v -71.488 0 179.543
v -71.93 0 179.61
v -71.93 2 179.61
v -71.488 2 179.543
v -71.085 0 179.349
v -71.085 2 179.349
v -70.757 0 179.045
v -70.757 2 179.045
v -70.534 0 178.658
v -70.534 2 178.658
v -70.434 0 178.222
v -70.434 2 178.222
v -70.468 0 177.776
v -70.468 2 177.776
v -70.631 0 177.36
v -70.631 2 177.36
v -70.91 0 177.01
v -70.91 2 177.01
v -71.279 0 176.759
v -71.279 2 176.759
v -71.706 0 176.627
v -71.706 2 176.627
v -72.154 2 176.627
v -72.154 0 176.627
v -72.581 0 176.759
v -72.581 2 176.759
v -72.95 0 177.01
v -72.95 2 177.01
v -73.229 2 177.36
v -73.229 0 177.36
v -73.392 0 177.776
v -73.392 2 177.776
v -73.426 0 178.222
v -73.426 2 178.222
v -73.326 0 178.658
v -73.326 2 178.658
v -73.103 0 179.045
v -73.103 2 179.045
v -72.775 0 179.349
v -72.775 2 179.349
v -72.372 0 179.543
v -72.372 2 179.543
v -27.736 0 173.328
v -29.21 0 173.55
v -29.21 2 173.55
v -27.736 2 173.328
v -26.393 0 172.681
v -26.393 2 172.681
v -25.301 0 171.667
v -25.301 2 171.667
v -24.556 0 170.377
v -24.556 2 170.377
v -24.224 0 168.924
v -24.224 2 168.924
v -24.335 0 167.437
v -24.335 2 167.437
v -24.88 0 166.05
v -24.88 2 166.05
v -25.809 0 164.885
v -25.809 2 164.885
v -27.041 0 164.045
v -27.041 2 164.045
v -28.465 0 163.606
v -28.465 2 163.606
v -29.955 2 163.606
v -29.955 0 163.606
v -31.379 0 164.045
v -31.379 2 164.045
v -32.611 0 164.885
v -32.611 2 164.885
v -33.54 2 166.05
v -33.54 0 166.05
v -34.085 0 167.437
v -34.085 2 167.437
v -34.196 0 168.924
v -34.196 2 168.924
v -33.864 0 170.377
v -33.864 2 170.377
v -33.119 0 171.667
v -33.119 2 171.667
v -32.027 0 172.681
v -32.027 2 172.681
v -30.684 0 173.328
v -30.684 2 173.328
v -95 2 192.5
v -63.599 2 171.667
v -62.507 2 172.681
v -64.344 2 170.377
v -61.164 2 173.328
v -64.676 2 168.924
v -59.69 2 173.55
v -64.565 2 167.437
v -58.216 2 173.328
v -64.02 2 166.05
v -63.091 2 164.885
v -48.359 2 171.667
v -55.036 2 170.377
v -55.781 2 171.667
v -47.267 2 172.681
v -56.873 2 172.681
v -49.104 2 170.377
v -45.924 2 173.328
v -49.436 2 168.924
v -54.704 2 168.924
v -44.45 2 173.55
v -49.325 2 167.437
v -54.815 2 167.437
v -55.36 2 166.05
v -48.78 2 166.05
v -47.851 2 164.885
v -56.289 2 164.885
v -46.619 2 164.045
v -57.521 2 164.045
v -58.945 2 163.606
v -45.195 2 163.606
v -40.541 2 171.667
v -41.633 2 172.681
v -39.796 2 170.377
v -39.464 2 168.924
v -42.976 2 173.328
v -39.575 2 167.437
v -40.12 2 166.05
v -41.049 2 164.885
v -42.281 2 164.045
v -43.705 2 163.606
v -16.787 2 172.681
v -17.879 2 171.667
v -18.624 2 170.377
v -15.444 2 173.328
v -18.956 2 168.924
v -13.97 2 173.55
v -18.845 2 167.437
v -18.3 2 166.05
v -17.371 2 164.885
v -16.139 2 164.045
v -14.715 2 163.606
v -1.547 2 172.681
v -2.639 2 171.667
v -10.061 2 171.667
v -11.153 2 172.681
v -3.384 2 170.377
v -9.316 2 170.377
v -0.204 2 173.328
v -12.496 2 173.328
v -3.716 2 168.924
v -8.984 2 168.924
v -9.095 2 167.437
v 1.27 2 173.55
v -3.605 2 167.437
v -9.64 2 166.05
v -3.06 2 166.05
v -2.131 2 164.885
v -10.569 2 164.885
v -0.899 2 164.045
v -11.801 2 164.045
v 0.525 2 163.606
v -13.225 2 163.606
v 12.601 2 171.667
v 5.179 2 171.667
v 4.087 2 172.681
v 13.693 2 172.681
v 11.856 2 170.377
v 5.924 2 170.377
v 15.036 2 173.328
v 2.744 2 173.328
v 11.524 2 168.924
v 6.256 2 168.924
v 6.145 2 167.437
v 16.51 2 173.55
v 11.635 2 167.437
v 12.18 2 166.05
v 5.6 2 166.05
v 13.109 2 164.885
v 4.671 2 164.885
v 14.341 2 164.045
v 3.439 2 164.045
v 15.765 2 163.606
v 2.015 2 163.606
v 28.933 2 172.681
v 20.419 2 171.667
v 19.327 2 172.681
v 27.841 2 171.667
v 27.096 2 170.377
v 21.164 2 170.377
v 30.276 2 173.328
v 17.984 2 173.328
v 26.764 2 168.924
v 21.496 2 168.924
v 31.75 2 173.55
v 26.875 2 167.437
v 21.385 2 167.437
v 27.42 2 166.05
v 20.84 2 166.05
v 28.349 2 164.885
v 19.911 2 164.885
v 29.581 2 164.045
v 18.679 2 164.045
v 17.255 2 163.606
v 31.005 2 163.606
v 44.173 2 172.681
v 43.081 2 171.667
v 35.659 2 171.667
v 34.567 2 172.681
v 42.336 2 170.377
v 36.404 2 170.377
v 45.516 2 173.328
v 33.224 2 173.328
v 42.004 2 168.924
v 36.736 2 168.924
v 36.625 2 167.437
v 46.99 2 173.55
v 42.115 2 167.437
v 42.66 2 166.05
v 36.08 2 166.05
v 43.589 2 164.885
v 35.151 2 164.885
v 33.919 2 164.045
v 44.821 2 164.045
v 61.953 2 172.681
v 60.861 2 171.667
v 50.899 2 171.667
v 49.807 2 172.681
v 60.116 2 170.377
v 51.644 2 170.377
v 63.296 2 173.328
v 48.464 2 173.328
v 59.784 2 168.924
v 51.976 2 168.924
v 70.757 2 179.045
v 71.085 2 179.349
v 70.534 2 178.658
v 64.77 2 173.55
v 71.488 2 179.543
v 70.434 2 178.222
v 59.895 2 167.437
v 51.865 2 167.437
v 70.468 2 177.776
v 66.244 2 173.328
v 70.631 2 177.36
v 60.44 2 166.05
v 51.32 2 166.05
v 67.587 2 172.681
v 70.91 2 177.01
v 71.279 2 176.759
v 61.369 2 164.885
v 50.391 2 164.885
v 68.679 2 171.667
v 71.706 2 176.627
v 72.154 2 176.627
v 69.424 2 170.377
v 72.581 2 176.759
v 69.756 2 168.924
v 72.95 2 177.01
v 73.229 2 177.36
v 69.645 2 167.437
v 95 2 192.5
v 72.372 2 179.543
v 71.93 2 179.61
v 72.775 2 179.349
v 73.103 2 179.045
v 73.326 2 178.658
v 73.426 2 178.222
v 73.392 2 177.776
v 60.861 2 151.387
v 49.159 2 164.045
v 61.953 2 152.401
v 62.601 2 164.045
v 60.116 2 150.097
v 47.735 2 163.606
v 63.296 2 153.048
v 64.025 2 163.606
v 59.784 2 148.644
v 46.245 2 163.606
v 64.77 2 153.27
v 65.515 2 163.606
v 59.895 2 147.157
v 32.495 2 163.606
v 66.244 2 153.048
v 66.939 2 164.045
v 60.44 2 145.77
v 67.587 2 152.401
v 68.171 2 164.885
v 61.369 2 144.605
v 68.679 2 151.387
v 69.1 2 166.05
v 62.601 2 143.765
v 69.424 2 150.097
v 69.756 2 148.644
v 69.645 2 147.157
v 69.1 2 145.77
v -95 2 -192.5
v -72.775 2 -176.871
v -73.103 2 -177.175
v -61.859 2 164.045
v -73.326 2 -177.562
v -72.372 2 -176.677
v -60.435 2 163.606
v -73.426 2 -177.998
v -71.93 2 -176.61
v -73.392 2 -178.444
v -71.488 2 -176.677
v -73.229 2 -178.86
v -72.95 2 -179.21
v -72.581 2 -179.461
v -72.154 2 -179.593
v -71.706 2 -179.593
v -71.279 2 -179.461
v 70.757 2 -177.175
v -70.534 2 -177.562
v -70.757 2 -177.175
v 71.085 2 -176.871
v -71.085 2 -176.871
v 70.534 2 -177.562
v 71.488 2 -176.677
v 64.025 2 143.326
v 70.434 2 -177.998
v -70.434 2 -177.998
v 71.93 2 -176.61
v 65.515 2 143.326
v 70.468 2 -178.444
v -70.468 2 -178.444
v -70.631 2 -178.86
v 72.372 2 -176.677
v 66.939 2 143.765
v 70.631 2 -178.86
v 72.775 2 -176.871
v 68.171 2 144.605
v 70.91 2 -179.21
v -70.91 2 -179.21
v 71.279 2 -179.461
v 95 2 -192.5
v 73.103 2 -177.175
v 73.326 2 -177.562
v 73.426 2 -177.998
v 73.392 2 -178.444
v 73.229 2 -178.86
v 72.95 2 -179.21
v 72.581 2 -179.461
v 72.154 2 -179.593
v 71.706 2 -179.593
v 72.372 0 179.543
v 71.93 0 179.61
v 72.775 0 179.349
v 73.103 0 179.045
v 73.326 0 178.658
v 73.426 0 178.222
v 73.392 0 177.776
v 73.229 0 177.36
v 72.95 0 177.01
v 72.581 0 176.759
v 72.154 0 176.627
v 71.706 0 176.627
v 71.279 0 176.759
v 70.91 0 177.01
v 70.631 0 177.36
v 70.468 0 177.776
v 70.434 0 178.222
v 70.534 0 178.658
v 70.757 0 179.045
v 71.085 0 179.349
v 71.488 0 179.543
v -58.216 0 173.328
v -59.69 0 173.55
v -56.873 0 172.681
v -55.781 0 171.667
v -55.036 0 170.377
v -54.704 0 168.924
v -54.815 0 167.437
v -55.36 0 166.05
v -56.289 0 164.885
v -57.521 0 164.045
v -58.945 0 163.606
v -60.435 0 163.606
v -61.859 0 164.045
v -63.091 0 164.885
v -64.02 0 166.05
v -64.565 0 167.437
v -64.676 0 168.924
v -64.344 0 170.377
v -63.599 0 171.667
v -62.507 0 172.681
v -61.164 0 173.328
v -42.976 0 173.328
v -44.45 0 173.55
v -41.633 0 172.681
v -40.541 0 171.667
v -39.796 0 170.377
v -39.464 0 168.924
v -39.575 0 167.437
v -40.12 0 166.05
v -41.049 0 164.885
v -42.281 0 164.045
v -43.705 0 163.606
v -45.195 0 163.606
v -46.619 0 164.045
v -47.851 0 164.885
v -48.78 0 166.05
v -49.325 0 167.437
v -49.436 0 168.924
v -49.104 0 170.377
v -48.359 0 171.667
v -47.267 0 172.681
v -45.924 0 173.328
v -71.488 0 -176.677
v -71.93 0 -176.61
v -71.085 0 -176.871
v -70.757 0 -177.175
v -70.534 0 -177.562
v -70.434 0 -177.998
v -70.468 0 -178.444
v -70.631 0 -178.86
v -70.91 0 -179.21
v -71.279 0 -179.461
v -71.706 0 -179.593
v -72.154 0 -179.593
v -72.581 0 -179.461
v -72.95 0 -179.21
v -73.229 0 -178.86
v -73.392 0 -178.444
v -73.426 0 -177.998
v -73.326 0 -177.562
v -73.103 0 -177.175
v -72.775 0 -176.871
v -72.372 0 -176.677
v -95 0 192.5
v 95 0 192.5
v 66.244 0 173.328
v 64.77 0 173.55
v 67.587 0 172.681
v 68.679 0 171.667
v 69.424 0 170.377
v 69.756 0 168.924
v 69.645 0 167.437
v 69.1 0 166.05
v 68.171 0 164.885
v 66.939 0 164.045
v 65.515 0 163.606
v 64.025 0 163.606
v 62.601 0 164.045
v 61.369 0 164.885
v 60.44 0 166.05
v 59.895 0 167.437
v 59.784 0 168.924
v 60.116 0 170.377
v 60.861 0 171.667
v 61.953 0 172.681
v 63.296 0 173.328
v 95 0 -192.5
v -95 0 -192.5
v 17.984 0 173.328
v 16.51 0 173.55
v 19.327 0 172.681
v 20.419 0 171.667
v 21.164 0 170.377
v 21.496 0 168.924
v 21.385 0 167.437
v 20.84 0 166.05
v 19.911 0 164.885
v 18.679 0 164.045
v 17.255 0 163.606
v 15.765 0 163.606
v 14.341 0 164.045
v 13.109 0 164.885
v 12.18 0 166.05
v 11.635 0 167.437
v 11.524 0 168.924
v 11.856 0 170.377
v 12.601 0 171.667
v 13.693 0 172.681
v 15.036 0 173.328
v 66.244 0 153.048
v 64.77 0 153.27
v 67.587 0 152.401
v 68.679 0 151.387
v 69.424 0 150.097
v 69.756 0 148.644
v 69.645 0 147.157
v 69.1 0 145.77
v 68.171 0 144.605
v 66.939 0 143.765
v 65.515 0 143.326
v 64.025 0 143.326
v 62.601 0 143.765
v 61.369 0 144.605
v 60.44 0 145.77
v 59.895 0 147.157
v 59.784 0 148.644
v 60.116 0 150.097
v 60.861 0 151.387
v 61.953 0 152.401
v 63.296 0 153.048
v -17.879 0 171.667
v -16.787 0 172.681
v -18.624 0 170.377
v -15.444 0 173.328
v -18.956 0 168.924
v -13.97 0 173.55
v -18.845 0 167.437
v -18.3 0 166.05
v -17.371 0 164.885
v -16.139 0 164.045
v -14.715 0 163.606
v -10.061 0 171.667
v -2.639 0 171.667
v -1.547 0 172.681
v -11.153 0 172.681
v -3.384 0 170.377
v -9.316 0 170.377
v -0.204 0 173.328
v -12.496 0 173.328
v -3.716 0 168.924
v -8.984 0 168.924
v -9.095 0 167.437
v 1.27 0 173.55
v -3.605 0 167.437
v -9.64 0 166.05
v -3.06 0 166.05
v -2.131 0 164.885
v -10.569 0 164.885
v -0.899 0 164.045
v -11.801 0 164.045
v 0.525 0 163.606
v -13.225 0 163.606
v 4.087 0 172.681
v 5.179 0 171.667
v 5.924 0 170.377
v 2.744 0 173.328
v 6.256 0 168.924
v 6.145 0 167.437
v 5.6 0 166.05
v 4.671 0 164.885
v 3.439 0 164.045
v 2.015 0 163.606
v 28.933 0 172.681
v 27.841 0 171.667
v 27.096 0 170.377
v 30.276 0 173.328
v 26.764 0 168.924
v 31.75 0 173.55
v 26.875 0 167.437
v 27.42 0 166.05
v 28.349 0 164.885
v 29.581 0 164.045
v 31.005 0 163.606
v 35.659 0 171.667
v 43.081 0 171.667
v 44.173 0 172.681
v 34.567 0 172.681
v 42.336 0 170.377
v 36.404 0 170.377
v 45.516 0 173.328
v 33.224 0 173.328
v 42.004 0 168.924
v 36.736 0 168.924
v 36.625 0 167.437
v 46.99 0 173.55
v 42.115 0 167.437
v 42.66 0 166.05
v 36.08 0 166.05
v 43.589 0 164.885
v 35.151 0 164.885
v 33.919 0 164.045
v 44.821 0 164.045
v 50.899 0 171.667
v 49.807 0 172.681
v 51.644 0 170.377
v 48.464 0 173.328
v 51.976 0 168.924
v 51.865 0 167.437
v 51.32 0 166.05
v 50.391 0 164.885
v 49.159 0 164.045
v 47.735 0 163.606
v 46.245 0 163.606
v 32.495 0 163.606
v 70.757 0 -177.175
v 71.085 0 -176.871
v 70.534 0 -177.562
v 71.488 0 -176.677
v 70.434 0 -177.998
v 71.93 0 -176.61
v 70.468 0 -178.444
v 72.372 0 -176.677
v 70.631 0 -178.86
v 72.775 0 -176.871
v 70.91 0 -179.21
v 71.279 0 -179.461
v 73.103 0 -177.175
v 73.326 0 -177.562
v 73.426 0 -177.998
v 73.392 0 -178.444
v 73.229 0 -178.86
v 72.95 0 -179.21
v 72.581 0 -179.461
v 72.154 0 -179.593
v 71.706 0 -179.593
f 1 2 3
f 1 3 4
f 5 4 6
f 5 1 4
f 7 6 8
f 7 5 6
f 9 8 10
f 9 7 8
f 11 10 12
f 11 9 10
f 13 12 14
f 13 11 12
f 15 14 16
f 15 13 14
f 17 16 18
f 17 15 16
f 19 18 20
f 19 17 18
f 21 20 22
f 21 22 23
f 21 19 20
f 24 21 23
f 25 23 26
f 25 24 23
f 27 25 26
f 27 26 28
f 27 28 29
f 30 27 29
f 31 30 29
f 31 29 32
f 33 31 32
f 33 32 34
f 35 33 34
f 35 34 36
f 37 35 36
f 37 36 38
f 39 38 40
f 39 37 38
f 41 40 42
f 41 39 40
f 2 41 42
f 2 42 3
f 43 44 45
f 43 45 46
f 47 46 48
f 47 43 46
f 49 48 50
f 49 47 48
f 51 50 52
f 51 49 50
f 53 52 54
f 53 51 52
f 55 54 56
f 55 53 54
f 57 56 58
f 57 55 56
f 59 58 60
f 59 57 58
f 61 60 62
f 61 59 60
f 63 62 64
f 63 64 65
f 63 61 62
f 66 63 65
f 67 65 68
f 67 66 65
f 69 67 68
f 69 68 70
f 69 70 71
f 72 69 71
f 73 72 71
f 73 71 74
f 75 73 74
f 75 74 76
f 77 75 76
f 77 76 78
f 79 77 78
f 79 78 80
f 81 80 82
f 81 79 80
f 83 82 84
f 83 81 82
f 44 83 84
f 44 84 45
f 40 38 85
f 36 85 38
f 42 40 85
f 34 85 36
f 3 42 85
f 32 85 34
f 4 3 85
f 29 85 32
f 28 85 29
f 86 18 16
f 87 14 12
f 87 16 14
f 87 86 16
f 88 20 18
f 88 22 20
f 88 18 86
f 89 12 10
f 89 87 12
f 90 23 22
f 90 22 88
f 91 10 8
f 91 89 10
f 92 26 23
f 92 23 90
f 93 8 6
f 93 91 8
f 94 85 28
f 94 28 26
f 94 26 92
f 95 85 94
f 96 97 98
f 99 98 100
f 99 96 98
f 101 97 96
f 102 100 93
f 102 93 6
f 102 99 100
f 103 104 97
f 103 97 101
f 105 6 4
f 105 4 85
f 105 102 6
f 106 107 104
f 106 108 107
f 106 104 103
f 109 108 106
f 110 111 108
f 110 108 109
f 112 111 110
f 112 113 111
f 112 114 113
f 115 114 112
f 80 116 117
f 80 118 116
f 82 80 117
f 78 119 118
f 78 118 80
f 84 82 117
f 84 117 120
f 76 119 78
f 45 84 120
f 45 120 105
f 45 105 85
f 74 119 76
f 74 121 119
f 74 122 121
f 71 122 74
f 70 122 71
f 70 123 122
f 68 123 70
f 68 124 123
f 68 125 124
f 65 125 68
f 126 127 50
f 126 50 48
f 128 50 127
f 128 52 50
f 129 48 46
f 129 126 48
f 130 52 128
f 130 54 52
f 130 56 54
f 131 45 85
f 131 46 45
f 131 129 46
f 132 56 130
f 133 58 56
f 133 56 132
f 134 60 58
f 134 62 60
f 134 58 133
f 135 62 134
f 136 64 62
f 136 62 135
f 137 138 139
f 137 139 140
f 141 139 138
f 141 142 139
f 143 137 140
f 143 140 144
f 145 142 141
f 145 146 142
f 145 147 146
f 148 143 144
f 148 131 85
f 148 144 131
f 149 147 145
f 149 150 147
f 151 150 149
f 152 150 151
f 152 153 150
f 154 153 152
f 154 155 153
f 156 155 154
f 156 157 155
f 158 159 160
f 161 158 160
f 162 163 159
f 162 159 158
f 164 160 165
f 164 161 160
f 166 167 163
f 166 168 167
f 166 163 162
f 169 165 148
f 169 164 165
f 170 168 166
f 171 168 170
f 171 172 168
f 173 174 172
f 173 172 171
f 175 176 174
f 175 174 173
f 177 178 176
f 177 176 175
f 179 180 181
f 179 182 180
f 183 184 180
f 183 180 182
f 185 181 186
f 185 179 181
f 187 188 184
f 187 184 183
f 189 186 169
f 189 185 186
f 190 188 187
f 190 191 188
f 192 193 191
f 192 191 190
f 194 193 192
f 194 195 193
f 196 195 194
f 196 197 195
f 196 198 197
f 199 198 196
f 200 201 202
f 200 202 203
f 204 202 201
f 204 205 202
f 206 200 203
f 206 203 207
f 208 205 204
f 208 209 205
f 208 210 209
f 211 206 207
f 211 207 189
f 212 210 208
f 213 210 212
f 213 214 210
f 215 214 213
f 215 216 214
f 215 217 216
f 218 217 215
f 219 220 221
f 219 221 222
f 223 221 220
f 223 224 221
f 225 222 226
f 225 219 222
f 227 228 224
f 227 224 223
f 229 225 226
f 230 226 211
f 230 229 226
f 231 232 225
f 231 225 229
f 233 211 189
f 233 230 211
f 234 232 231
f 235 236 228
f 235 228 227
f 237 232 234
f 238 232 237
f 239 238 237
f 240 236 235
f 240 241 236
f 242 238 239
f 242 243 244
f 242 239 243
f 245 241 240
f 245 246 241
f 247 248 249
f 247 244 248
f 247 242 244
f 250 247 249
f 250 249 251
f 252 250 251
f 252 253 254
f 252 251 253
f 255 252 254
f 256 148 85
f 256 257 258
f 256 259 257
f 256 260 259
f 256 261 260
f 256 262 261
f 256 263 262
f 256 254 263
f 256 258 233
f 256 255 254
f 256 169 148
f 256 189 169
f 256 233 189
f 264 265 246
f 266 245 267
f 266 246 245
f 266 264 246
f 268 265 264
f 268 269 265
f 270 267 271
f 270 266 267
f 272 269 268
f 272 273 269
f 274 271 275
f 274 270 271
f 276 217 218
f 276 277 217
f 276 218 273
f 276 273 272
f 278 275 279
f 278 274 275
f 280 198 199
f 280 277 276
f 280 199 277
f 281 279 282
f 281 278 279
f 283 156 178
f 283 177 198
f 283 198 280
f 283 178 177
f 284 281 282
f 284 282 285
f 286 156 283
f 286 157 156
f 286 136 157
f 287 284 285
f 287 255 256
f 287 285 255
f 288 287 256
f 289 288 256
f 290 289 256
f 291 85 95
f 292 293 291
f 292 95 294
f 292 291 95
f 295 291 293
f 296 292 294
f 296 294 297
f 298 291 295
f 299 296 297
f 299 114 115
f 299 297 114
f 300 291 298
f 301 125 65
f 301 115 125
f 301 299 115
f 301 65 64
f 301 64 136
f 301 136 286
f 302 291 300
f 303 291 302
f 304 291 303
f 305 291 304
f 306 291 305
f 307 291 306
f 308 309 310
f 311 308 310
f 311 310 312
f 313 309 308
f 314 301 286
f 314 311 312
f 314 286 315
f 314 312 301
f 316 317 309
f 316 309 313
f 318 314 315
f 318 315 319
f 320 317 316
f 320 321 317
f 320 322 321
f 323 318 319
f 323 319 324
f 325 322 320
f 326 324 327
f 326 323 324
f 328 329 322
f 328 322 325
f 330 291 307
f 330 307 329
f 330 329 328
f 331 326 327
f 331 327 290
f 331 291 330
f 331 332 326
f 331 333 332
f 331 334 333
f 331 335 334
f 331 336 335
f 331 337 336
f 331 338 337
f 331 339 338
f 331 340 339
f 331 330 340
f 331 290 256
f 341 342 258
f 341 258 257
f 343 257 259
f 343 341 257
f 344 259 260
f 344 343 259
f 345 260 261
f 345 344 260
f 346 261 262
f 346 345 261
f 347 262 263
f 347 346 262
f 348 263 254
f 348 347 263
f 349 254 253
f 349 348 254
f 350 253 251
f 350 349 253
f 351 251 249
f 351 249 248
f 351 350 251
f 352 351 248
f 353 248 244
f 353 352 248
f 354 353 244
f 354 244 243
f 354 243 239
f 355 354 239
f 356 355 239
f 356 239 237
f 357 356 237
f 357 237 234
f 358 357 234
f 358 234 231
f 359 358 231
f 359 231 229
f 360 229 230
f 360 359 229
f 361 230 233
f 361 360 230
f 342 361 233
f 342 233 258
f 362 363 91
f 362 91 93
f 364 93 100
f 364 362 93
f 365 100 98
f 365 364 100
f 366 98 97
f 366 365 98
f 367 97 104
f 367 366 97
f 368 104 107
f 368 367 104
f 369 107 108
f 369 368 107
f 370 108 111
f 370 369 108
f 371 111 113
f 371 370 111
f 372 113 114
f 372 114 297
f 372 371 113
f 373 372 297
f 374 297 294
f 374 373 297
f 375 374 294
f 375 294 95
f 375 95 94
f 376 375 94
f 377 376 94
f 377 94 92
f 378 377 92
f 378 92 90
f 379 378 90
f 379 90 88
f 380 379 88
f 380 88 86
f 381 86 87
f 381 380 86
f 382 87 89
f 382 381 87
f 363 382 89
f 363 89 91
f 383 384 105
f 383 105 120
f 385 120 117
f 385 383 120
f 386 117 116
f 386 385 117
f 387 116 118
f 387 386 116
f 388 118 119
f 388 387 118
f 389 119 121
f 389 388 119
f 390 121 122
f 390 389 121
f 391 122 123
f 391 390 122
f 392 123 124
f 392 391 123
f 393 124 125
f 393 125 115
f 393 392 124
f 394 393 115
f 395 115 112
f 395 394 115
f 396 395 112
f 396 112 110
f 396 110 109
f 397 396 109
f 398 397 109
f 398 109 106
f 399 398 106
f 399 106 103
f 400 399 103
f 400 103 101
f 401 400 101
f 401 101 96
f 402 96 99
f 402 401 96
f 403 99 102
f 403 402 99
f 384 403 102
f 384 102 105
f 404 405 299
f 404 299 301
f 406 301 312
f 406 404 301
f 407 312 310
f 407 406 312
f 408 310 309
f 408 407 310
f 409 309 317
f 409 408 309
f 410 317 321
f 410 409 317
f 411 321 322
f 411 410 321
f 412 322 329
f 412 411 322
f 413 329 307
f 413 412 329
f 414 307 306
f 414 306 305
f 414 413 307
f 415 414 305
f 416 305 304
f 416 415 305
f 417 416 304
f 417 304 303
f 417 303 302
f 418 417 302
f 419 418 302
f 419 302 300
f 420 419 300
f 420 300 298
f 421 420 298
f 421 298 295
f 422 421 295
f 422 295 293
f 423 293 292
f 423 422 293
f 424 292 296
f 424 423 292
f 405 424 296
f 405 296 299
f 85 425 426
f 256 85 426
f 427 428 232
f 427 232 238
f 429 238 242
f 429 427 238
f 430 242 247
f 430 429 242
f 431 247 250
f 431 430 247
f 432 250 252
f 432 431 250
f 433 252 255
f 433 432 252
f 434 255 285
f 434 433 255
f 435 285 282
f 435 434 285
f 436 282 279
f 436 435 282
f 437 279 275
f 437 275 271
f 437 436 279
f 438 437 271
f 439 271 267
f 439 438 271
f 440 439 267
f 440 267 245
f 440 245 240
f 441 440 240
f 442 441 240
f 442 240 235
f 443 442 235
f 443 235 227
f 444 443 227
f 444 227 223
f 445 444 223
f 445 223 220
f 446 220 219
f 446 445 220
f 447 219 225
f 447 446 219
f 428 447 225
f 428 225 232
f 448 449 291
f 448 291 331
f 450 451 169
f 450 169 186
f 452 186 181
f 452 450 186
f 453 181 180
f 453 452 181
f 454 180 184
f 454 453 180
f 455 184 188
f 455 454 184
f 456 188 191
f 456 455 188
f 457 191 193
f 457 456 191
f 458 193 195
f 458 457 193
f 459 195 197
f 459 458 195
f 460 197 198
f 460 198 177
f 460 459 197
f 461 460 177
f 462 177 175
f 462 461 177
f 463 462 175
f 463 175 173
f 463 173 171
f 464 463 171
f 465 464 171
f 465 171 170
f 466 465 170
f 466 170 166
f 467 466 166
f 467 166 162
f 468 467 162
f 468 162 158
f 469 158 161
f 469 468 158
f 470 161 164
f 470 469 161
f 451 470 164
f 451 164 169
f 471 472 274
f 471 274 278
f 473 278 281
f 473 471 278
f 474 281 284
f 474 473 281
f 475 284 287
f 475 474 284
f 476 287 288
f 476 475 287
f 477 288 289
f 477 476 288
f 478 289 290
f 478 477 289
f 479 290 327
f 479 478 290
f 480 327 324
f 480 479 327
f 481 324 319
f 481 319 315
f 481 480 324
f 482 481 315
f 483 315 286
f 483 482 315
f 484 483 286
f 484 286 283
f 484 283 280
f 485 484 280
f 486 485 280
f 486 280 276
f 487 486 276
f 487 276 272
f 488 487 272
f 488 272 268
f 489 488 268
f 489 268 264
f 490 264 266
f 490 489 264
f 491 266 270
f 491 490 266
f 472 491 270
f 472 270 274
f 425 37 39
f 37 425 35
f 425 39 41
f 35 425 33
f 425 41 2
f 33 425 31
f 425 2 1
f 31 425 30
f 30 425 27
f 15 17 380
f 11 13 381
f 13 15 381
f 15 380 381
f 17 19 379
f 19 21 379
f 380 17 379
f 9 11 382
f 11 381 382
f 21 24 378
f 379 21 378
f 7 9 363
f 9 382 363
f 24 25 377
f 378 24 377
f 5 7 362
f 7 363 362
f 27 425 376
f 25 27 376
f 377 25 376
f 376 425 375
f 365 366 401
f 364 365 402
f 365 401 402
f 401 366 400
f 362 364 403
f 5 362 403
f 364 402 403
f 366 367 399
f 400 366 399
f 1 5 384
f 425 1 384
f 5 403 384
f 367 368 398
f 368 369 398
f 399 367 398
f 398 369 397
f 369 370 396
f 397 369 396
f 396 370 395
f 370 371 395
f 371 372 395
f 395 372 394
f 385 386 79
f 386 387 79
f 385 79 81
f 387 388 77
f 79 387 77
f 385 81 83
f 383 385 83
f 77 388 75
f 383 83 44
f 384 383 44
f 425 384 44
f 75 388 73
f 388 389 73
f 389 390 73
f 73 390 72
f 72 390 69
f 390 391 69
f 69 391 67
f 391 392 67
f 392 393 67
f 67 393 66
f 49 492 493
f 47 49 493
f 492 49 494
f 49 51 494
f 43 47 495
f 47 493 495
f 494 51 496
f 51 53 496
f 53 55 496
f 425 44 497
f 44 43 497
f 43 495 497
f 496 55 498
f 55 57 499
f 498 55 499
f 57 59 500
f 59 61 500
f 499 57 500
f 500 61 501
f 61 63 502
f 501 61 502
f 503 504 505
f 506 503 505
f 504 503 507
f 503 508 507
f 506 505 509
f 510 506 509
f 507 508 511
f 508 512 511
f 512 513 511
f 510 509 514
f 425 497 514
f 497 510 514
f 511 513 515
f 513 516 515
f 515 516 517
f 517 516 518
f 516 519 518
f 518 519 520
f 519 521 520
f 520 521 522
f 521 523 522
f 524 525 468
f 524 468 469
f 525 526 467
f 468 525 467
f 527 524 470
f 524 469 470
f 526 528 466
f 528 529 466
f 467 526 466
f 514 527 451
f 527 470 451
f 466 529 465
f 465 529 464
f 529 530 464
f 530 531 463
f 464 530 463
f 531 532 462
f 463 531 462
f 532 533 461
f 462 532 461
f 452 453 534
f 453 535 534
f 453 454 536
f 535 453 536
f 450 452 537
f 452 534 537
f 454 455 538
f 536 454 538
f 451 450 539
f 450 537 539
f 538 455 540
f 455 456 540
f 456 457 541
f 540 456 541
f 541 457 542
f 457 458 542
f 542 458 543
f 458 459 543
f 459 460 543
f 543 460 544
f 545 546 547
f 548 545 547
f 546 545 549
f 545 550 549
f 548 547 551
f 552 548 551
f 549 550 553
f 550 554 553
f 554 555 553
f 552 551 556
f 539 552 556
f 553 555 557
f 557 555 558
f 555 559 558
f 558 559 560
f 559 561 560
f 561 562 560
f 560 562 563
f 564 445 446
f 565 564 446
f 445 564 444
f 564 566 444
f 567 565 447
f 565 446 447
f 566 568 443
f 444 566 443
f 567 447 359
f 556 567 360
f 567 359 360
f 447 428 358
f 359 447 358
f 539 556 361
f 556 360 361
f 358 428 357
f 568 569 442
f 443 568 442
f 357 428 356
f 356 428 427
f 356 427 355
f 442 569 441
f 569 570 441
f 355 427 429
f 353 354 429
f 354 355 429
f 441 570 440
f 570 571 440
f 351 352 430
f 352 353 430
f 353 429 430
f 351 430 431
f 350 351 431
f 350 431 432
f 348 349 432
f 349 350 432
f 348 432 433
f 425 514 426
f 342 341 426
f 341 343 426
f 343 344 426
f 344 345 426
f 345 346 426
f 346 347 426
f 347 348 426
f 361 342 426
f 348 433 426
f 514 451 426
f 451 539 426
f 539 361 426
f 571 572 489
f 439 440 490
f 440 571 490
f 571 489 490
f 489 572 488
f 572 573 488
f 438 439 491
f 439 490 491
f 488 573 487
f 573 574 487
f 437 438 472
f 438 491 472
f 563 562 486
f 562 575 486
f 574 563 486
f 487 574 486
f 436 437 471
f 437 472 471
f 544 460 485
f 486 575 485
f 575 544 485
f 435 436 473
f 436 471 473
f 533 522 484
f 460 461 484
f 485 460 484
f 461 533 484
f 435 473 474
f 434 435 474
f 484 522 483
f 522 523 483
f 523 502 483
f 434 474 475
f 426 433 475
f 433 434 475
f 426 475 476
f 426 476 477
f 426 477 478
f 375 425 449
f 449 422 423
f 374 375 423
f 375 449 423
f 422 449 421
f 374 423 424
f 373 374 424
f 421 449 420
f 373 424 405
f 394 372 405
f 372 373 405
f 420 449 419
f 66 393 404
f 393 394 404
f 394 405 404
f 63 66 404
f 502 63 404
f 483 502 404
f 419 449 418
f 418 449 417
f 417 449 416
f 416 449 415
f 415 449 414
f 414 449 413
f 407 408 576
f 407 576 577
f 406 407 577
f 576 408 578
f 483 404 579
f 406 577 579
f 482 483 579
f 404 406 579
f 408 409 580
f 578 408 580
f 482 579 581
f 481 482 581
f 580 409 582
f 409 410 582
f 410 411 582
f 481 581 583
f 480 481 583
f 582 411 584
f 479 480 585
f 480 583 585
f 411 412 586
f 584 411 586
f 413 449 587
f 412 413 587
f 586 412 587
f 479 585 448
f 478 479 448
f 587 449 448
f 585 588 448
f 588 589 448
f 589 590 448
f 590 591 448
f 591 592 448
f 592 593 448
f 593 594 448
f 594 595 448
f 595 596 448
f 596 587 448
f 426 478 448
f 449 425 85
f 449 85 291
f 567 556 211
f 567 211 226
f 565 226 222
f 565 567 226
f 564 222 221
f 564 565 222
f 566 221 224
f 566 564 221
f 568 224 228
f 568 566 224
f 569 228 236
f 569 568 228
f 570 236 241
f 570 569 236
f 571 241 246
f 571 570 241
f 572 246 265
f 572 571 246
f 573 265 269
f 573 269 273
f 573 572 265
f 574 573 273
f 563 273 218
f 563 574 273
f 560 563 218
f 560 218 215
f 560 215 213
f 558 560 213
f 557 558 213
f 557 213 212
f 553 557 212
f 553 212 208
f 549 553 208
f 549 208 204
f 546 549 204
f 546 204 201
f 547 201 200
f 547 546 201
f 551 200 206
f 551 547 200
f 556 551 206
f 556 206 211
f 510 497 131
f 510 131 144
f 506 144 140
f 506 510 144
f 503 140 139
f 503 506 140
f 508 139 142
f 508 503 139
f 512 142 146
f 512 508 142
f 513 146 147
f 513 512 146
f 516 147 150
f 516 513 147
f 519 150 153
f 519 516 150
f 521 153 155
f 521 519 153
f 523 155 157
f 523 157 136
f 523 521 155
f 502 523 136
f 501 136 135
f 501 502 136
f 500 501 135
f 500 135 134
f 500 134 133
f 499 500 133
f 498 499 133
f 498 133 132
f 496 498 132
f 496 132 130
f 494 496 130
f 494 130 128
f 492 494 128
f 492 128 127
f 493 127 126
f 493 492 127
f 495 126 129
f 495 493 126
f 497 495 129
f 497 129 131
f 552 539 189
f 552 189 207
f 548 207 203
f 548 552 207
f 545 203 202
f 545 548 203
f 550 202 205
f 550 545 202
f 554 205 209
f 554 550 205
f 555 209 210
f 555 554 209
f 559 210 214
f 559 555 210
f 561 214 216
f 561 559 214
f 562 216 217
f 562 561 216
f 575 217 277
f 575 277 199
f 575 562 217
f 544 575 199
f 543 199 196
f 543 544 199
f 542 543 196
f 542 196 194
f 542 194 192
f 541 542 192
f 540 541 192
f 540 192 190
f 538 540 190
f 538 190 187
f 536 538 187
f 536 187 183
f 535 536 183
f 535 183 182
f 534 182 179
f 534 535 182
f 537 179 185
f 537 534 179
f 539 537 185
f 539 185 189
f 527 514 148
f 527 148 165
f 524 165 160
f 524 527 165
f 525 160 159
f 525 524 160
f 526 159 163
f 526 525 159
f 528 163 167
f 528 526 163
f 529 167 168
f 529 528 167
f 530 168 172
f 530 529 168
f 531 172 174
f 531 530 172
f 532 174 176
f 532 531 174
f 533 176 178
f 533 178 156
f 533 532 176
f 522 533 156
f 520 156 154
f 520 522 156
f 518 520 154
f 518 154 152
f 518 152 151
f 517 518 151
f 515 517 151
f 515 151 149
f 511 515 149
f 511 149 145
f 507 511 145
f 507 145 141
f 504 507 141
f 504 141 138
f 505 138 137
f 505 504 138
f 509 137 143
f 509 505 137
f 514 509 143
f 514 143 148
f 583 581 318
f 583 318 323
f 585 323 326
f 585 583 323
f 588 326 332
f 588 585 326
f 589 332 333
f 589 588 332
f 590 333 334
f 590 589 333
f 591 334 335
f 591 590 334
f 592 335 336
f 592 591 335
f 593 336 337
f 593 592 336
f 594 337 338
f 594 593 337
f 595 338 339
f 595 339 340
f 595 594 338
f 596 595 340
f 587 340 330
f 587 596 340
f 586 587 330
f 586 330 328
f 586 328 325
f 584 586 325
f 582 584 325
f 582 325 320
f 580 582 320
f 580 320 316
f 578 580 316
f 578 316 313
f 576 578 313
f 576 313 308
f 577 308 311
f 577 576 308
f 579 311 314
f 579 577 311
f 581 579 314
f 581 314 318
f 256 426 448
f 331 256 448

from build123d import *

# Parameters (mm, degrees)
SKETCH1_W           = 190
SKETCH1_H           = 385
SKETCH1_R           = 5
SKETCH1_R_2         = 1.5
BOSS_EXTRUDE1_DEPTH = 2


with BuildPart() as part:
    # Sketch1 → Boss-Extrude1 (new body)
    with BuildSketch(Plane(origin=(0, 0, 0), x_dir=(1, 0, 0), z_dir=(0, 1, 0))):
        Rectangle(SKETCH1_W, SKETCH1_H)
        with Locations(Location((-59.69, -168.55, 0), (0, 0, 270))):
            Circle(SKETCH1_R, mode=Mode.SUBTRACT)
        with Locations(Location((-44.45, -168.55, 0), (0, 0, 270))):
            Circle(SKETCH1_R, mode=Mode.SUBTRACT)
        with Locations(Location((-29.21, -168.55, 0), (0, 0, 270))):
            Circle(SKETCH1_R, mode=Mode.SUBTRACT)
        with Locations(Location((-13.97, -168.55, 0), (0, 0, 270))):
            Circle(SKETCH1_R, mode=Mode.SUBTRACT)
        with Locations(Location((1.27, -168.55, 0), (0, 0, 270))):
            Circle(SKETCH1_R, mode=Mode.SUBTRACT)
        with Locations(Location((16.51, -168.55, 0), (0, 0, 270))):
            Circle(SKETCH1_R, mode=Mode.SUBTRACT)
        with Locations(Location((31.75, -168.55, 0), (0, 0, 270))):
            Circle(SKETCH1_R, mode=Mode.SUBTRACT)
        with Locations(Location((46.99, -168.55, 0), (0, 0, 270))):
            Circle(SKETCH1_R, mode=Mode.SUBTRACT)
        with Locations(Location((64.77, -168.55, 0), (0, 0, 270))):
            Circle(SKETCH1_R, mode=Mode.SUBTRACT)
        with Locations(Location((64.77, -148.27, 0), (0, 0, 270))):
            Circle(SKETCH1_R, mode=Mode.SUBTRACT)
        with Locations(Location((-71.93, 178.11, 0), (0, 0, 270))):
            Circle(SKETCH1_R_2, mode=Mode.SUBTRACT)
        with Locations(Location((71.93, 178.11, 0), (0, 0, 270))):
            Circle(SKETCH1_R_2, mode=Mode.SUBTRACT)
        with Locations(Location((71.93, -178.11, 0), (0, 0, 270))):
            Circle(SKETCH1_R_2, mode=Mode.SUBTRACT)
        with Locations(Location((-71.93, -178.11, 0), (0, 0, 270))):
            Circle(SKETCH1_R_2, mode=Mode.SUBTRACT)
    extrude(amount=BOSS_EXTRUDE1_DEPTH)


solid = part.part
